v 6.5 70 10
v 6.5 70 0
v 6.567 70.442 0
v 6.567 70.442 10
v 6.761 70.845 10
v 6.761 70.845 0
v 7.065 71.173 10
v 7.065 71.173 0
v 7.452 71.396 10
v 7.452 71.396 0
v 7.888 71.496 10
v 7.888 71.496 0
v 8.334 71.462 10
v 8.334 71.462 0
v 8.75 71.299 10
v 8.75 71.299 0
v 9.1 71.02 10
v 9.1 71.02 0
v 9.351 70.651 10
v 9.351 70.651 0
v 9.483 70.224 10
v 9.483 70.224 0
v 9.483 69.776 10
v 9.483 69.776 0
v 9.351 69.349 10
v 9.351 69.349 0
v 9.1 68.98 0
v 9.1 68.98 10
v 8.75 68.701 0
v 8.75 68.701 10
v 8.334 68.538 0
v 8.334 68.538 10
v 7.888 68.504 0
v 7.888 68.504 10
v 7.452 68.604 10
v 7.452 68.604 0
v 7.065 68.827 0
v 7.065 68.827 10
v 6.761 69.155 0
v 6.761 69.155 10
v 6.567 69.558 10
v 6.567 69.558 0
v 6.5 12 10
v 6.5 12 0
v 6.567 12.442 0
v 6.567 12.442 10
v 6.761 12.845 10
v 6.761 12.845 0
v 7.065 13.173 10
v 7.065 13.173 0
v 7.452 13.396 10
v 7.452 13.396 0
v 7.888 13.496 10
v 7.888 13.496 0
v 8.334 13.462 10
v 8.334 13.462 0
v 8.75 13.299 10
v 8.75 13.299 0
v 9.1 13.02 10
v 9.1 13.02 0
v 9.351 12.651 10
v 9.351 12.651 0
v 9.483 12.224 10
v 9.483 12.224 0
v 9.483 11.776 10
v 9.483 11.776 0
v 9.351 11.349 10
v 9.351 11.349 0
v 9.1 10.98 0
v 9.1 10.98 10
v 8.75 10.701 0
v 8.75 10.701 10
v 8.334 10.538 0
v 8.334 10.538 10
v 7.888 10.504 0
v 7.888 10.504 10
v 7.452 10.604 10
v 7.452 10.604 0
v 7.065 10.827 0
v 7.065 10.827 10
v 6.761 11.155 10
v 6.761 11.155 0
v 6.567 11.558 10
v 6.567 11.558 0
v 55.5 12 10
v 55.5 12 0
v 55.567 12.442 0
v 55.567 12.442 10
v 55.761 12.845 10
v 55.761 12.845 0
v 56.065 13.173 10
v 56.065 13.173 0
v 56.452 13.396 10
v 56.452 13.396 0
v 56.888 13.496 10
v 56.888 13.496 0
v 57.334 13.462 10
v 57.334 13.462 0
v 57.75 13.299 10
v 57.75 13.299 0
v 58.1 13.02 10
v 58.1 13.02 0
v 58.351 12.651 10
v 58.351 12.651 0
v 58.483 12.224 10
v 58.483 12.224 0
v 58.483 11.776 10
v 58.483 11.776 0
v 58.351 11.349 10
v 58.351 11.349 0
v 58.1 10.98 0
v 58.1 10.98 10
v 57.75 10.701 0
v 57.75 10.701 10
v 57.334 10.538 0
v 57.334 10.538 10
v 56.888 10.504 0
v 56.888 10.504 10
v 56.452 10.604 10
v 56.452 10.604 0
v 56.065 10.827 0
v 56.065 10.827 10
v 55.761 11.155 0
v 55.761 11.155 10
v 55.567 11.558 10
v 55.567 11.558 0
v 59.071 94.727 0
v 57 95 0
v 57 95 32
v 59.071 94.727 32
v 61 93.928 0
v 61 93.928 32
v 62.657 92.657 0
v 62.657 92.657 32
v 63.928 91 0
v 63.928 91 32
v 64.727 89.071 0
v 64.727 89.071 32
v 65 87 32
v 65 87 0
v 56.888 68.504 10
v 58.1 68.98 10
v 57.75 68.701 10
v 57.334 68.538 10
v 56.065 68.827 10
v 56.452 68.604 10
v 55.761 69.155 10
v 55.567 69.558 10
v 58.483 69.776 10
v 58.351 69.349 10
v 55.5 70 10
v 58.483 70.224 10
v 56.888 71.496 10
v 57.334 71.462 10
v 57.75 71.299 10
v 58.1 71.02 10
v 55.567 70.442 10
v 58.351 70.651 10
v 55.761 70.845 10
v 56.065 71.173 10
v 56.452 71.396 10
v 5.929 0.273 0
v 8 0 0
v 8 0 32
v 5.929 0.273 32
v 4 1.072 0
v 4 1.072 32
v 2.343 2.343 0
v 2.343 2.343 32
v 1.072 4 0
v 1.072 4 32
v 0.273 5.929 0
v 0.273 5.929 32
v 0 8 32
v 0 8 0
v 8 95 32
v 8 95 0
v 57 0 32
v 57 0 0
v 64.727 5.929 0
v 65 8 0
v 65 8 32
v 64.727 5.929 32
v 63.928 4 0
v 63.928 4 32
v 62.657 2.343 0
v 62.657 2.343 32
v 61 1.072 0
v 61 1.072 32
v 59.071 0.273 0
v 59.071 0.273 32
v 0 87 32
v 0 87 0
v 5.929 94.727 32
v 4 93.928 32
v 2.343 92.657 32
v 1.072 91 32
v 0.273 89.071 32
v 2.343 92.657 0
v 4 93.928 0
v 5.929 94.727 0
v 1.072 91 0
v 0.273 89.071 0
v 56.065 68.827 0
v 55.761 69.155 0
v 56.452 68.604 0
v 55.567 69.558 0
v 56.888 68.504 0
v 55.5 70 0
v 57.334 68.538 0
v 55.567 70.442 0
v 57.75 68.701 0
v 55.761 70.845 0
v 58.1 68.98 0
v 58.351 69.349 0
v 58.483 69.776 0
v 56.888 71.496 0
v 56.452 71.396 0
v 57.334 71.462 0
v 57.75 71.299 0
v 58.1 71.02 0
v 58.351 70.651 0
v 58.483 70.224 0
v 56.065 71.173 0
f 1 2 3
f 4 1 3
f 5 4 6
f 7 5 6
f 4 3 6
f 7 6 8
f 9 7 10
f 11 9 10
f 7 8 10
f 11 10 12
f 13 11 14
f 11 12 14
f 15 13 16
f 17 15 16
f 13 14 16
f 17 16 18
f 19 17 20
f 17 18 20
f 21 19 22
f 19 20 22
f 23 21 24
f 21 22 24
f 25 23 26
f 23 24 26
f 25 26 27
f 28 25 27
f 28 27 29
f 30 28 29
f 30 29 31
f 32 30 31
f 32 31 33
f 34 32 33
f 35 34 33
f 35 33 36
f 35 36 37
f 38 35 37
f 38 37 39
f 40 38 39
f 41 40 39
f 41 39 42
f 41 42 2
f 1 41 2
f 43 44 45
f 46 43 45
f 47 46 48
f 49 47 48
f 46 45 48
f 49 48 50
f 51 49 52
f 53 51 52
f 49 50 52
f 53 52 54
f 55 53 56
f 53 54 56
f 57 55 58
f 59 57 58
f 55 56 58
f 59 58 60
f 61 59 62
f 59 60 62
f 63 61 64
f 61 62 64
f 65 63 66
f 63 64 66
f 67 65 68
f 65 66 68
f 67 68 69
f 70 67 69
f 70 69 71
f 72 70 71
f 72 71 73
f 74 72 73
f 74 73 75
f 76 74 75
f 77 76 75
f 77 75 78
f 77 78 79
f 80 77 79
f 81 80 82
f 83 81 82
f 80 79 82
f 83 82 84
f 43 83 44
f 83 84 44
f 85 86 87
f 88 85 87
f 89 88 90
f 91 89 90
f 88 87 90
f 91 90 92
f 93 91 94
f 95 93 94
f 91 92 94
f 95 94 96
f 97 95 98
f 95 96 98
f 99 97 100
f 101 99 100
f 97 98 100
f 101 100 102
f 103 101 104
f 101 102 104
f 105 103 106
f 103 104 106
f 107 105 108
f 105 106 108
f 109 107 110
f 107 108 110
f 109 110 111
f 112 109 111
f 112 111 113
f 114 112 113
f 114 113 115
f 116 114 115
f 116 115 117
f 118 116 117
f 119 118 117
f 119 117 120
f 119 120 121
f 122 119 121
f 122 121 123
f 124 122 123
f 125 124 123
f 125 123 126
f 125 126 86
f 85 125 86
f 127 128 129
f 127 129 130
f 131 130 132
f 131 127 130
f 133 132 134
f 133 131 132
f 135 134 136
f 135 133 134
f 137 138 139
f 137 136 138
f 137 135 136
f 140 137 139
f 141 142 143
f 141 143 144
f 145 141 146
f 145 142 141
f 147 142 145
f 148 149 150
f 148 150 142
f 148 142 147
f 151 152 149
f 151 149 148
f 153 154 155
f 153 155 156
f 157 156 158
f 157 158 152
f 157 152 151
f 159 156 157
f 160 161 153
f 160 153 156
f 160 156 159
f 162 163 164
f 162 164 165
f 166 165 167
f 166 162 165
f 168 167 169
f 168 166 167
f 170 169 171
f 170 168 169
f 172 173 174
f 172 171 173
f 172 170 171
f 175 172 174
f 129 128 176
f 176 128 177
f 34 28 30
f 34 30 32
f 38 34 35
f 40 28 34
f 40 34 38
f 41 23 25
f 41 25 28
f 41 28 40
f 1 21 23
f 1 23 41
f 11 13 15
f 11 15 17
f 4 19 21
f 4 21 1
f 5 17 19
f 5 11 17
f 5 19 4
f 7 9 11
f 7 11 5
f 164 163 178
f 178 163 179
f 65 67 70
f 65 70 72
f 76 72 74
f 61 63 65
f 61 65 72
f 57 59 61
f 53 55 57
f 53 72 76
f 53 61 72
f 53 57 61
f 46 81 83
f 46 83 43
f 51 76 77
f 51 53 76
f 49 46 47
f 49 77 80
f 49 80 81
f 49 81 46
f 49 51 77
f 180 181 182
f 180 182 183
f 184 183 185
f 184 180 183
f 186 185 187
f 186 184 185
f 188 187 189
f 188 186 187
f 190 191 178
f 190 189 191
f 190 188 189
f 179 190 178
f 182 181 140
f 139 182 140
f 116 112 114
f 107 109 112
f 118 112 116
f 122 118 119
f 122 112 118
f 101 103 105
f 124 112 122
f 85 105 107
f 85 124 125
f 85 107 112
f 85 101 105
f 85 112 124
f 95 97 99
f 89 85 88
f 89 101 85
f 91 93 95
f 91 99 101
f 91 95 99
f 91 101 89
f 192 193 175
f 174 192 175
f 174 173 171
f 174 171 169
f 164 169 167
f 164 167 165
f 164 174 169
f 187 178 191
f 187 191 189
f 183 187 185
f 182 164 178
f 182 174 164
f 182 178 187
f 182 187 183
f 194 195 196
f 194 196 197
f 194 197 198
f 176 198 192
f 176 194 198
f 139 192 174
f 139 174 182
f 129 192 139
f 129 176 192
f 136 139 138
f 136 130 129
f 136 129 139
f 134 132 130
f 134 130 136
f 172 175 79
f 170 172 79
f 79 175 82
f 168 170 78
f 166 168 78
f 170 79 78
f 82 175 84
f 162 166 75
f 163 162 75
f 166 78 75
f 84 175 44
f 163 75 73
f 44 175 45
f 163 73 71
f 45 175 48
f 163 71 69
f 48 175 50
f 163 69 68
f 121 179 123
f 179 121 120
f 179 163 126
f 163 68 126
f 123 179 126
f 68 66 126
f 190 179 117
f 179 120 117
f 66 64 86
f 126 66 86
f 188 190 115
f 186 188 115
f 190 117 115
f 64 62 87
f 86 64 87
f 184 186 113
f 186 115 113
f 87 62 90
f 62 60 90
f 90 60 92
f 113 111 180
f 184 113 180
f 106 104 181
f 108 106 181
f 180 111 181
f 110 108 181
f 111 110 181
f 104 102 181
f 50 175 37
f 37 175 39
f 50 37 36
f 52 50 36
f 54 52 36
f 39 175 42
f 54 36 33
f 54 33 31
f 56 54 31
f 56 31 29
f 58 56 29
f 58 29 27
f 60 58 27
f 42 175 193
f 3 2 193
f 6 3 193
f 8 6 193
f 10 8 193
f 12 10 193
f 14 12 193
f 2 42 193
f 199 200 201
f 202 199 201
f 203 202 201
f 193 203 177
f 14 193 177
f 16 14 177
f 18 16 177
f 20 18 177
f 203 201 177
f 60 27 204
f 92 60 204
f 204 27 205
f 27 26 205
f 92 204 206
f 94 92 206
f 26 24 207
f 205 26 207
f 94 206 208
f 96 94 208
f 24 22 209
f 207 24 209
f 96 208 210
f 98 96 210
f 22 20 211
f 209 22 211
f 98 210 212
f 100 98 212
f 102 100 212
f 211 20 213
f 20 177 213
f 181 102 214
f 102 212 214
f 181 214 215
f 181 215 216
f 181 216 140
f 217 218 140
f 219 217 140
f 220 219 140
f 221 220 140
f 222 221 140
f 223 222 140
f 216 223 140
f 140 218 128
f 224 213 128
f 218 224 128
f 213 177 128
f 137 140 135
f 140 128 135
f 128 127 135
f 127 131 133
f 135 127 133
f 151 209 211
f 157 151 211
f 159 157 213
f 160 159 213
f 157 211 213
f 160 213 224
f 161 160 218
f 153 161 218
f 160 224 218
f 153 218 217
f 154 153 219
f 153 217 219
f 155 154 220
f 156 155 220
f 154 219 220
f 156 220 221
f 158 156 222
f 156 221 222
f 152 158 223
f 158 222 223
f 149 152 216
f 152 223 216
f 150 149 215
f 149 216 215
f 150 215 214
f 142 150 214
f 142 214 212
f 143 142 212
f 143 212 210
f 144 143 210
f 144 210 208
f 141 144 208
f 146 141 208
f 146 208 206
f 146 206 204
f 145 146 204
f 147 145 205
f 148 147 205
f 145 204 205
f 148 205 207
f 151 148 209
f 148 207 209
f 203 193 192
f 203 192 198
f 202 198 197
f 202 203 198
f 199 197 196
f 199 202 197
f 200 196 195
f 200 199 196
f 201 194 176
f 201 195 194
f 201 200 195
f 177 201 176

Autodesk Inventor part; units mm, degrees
ref_plane "YZ Plane" through (0, 0, 0) normal (1, 0, 0) x (0, 1, 0)
ref_plane "XZ Plane" through (0, 0, 0) normal (0, 1, 0) x (-1, 0, 0)
ref_plane "XY Plane" through (0, 0, 0) normal (0, 0, 1) x (1, 0, 0)
sketch "Sketch1" plane through (0, 0, 0) normal (0, 0, 1) x (1, 0, 0)
  line L0 (8, 0) -> (57, 0)
  line L1 (65, 8) -> (65, 87)
  line L2 (57, 95) -> (8, 95)
  line L3 (0, 87) -> (0, 8)
  arc A0 (0, 8) -> (8, 0) centre (8, 8) ccw
  arc A1 (8, 95) -> (0, 87) centre (8, 87) ccw
  arc A2 (65, 87) -> (57, 95) centre (57, 87) ccw
  arc A3 (57, 0) -> (65, 8) centre (57, 8) ccw
  point P0 (0, 0)
  point P1 (65, 95)
  point P2 (65, 0)
  point P3 (0, 95)
  dimension "d0" = 65
  dimension "d1" = 95
  dimension "d2" = 8
extrude "Extrusion1" add sketch "Sketch1" along normal blind 32
sketch "Sketch2" plane through (0, 0, 0) normal (0, 0, -1) x (-1, 0, 0)
  line L0 (-8, 12) -> (-57, 12) construction
  line L1 (-57, 12) -> (-57, 70) construction
  line L2 (-57, 70) -> (-8, 70) construction
  line L3 (-8, 70) -> (-8, 12) construction
  line L4 (-8, 0) -> (-57, 0) projected
  line L5 (-32.5, 0) -> (-32.5, 94.8442) construction
  circle A0 centre (-57, 12) radius 1.5
  circle A1 centre (-57, 70) radius 1.5
  circle A2 centre (-8, 70) radius 1.5
  circle A3 centre (-8, 12) radius 1.5
  line L6 (-16.9436, 109.56) -> (-16.9436, 104.8114) projected
  line L7 (-40.3748, 104.8114) -> (-28.4573, 104.8114) projected
  line L8 (0.0184, 88.6231) -> (0.0184, 5.8494) projected
  line L9 (-28.0001, -10.2773) -> (-40.3748, -10.2773) projected
  line L10 (-16.9436, -10.2773) -> (-16.9436, -14.3057) projected
  line L11 (-21.9436, -19.3057) -> (-23.0001, -19.3057) projected
  line L12 (-28.0001, -14.3057) -> (-28.0001, -10.2773) projected
  line L13 (-40.3748, -10.2773) -> (-40.3748, -14.3057) projected
  line L14 (-45.3748, -19.3057) -> (-47.2671, -19.3057) projected
  line L15 (-52.2671, -14.3057) -> (-52.2671, -10.2773) projected
  line L16 (-64.9916, 6.3782) -> (-64.9916, 88.5882) projected
  line L17 (-52.2671, 104.8114) -> (-52.2671, 109.56) projected
  line L18 (-47.2671, 114.56) -> (-45.3748, 114.56) projected
  line L19 (-40.3748, 109.56) -> (-40.3748, 104.8114) projected
  line L20 (-28.4573, 104.8114) -> (-28.4573, 109.56) projected
  line L21 (-23.4573, 114.56) -> (-21.9436, 114.56) projected
  line L22 (-15.7324, 83.4806) -> (-23.5066, 91.204) projected
  arc A4 (-23.5066, 91.204) -> (-27.0305, 92.6569) centre (-27.0305, 87.6569) ccw projected
  line L23 (-27.0305, 92.6569) -> (-42.3584, 92.6569) projected
  arc A5 (-42.3584, 92.6569) -> (-45.8878, 91.1985) centre (-42.3584, 87.6569) ccw projected
  line L24 (-45.8878, 91.1985) -> (-50.0687, 87.0321) projected
  arc A6 (-50.0687, 87.0321) -> (-51.5393, 83.4904) centre (-46.5393, 83.4904) ccw projected
  line L25 (-51.5393, 83.4904) -> (-51.5393, 49.6697) projected
  arc A7 (-51.5393, 49.6697) -> (-49.6635, 45.7659) centre (-46.5393, 49.6697) ccw projected
  line L26 (-49.6635, 45.7659) -> (-44.7373, 41.8235) projected
  arc A8 (-44.7373, 41.8235) -> (-41.6131, 40.7274) centre (-41.6131, 45.7274) ccw projected
  line L27 (-41.6131, 40.7274) -> (-23.3988, 40.7274) projected
  arc A9 (-23.3988, 40.7274) -> (-20.0405, 42.0231) centre (-23.3988, 45.7274) ccw projected
  line L28 (-20.0405, 42.0231) -> (-15.898, 45.7787) projected
  arc A10 (-15.898, 45.7787) -> (-14.2563, 49.483) centre (-19.2563, 49.483) ccw projected
  line L29 (-14.2563, 49.483) -> (-14.2563, 79.9335) projected
  arc A11 (-14.2563, 79.9335) -> (-15.7324, 83.4806) centre (-19.2563, 79.9335) ccw projected
  line L30 (-14.2563, 9.4113) -> (-14.2563, 25.1215) projected
  arc A12 (-14.2563, 25.1215) -> (-16.1322, 29.0254) centre (-19.2563, 25.1215) ccw projected
  line L31 (-16.1322, 29.0254) -> (-19.9618, 32.0901) projected
  arc A13 (-19.9618, 32.0901) -> (-23.0859, 33.1863) centre (-23.0859, 28.1863) ccw projected
  line L32 (-23.0859, 33.1863) -> (-41.6879, 33.1863) projected
  arc A14 (-41.6879, 33.1863) -> (-44.5033, 32.3183) centre (-41.6879, 28.1863) ccw projected
  line L33 (-44.5033, 32.3183) -> (-49.3548, 29.0127) projected
  arc A15 (-49.3548, 29.0127) -> (-51.5393, 24.8807) centre (-46.5393, 24.8807) ccw projected
  line L34 (-51.5393, 24.8807) -> (-51.5393, 7.149) projected
  arc A16 (-51.5393, 7.149) -> (-50.9681, 4.8281) centre (-46.5393, 7.149) ccw projected
  line L35 (-50.9681, 4.8281) -> (-49.1556, 1.3694) projected
  arc A17 (-49.1556, 1.3694) -> (-44.7268, -1.3097) centre (-44.7268, 3.6903) ccw projected
  line L36 (-44.7268, -1.3097) -> (-23.7592, -1.3097) projected
  arc A18 (-23.7592, -1.3097) -> (-19.8301, 0.5979) centre (-23.7592, 3.6903) ccw projected
  line L37 (-19.8301, 0.5979) -> (-15.3273, 6.3189) projected
  arc A19 (-15.3273, 6.3189) -> (-14.2563, 9.4113) centre (-19.2563, 9.4113) ccw projected
  arc A20 (-64.9916, 6.3782) -> (-63.7832, 3.1188) centre (-59.9916, 6.3782) ccw projected
  arc A21 (-63.7296, 91.909) -> (-64.9916, 88.5882) centre (-59.9916, 88.5882) ccw projected
  line L38 (-63.7296, 91.909) -> (-52.2671, 104.8114) projected
  arc A22 (-47.2671, 114.56) -> (-52.2671, 109.56) centre (-47.2671, 109.56) ccw projected
  arc A23 (-40.3748, 109.56) -> (-45.3748, 114.56) centre (-45.3748, 109.56) ccw projected
  arc A24 (-23.4573, 114.56) -> (-28.4573, 109.56) centre (-23.4573, 109.56) ccw projected
  arc A25 (-16.9436, 109.56) -> (-21.9436, 114.56) centre (-21.9436, 109.56) ccw projected
  line L39 (-16.9436, 104.8114) -> (-1.8245, 92.5003) projected
  arc A26 (0.0184, 88.6231) -> (-1.8245, 92.5003) centre (-4.9816, 88.6231) ccw projected
  arc A27 (-1.834, 1.9645) -> (0.0184, 5.8494) centre (-4.9816, 5.8494) ccw projected
  line L40 (-1.834, 1.9645) -> (-16.9436, -10.2773) projected
  arc A28 (-21.9436, -19.3057) -> (-16.9436, -14.3057) centre (-21.9436, -14.3057) ccw projected
  arc A29 (-28.0001, -14.3057) -> (-23.0001, -19.3057) centre (-23.0001, -14.3057) ccw projected
  arc A30 (-45.3748, -19.3057) -> (-40.3748, -14.3057) centre (-45.3748, -14.3057) ccw projected
  arc A31 (-52.2671, -14.3057) -> (-47.2671, -19.3057) centre (-47.2671, -14.3057) ccw projected
  line L41 (-52.2671, -10.2773) -> (-63.7832, 3.1188) projected
  circle A32 centre (-57, 70) radius 2 projected
  circle A33 centre (-57, 12) radius 2 projected
  circle A34 centre (-8, 70) radius 2 projected
  circle A35 centre (-8, 12) radius 2 projected
  circle A36 centre (-22.639, 109.6569) radius 1.75 projected
  circle A37 centre (-46.639, -14.5983) radius 1.75 projected
  circle A38 centre (-46.639, 109.6569) radius 1.75 projected
  circle A39 centre (-22.639, -14.5983) radius 1.75 projected
  point P0 (0, 0)
  dimension "d5" = 49
  dimension "d6" = 58
  dimension "d7" = 24.5
  dimension "d8" = 12
  dimension "d9" = 3
  dimension "d10" = 3
  dimension "d11" = 3
  dimension "d12" = 3
extrude "Extrusion2" cut sketch "Sketch2" against normal blind 10 contours A0 | A1 | A2 | A3
properties part number "RPI"
